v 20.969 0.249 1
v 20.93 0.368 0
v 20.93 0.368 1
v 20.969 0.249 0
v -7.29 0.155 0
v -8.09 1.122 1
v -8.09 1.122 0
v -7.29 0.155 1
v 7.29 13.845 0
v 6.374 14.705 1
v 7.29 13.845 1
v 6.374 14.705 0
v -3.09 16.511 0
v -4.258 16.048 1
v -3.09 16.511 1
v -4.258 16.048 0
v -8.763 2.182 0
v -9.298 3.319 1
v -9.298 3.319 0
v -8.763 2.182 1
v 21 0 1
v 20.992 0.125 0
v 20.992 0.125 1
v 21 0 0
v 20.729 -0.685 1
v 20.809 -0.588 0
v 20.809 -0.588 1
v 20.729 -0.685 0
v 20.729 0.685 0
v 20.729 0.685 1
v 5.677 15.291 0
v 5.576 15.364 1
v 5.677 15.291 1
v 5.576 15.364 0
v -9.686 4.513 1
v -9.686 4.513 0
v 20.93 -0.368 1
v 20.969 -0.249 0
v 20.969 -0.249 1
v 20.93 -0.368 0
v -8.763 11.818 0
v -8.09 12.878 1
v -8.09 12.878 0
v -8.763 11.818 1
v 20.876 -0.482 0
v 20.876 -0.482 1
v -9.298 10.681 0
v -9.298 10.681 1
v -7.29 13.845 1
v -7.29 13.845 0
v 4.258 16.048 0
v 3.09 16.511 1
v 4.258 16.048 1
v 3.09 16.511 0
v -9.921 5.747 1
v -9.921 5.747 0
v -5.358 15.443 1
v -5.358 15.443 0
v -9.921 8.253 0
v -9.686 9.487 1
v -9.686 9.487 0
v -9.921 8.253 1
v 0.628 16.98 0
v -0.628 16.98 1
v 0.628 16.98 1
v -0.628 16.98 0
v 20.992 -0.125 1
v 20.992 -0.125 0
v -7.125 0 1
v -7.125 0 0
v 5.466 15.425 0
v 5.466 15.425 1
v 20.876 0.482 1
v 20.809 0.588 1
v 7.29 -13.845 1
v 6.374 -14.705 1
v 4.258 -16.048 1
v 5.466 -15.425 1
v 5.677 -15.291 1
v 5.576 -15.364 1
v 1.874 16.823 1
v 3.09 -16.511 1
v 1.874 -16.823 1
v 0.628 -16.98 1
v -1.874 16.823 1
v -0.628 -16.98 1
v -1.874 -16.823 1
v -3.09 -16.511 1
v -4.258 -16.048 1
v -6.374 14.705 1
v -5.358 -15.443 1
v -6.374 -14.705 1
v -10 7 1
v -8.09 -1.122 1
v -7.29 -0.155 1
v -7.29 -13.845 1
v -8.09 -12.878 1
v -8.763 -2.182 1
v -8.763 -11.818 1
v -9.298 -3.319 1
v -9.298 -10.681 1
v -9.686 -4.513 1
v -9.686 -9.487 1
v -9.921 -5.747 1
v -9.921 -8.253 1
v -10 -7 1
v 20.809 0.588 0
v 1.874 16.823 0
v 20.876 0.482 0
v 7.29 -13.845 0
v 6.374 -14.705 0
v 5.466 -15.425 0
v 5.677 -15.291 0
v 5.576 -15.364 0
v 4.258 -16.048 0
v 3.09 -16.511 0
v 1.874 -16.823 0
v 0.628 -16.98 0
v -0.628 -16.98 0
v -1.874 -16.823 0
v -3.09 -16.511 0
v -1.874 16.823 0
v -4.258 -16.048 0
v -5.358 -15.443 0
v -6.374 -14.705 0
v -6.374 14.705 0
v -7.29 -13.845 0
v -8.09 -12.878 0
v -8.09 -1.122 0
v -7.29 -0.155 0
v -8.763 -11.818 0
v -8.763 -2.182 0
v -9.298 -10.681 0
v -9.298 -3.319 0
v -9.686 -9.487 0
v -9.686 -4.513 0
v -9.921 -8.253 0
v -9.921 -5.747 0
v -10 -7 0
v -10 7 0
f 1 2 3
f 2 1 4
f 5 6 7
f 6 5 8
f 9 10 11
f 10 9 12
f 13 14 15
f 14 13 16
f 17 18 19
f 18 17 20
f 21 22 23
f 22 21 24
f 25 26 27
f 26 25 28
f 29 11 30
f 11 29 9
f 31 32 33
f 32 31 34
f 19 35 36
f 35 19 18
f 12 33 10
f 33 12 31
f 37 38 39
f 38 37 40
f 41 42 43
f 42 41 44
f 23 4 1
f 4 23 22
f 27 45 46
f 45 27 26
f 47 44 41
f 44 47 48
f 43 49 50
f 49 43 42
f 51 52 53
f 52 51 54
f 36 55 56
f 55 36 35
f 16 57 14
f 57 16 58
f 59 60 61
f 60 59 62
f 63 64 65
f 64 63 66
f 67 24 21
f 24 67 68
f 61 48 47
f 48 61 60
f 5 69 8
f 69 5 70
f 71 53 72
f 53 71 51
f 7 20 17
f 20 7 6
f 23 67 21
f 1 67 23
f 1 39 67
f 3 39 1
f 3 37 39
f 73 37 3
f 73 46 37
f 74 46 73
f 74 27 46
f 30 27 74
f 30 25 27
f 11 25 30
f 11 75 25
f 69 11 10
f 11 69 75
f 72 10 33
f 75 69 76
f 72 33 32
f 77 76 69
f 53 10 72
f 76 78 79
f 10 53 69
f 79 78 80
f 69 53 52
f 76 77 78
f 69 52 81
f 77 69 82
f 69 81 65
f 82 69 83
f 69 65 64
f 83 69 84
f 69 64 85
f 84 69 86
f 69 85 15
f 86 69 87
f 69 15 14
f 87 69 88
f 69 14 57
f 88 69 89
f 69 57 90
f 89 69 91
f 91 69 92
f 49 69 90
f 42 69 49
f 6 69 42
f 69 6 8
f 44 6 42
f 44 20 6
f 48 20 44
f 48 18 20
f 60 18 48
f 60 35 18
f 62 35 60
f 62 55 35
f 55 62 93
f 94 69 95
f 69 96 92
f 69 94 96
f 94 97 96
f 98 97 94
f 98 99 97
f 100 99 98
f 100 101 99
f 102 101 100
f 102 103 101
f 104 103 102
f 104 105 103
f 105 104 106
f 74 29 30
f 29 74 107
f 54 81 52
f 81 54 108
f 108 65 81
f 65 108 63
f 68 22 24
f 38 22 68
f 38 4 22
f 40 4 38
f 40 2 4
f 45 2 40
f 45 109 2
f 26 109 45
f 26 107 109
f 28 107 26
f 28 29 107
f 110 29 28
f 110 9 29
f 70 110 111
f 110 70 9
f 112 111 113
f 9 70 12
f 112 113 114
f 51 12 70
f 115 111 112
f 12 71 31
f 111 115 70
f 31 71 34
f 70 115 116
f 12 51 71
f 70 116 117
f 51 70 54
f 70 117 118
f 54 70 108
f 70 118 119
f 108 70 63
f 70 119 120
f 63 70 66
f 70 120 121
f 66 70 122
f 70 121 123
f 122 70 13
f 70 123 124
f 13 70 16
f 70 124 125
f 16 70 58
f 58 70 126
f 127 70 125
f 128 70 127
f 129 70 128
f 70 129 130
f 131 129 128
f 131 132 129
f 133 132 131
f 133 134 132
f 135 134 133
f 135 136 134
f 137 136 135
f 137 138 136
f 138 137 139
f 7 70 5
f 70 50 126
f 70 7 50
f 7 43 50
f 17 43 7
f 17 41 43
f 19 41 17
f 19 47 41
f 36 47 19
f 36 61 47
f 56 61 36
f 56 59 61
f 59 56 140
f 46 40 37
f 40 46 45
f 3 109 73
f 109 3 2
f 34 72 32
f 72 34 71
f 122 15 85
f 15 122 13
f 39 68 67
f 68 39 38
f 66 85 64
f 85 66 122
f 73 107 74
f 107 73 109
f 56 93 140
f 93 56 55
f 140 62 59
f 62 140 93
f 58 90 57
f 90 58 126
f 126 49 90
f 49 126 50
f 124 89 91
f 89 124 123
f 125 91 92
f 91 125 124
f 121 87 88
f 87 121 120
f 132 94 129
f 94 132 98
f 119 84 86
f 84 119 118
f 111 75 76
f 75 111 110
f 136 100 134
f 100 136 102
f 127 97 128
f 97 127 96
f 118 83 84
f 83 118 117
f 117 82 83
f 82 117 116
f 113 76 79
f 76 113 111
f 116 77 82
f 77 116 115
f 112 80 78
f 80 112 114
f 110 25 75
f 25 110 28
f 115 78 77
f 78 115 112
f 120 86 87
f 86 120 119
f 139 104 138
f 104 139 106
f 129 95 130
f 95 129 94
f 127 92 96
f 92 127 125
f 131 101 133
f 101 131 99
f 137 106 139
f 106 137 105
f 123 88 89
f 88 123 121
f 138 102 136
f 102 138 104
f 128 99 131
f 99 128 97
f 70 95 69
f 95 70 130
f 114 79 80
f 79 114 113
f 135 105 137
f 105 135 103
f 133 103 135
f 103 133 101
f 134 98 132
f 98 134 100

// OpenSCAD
$fn=50;
union() {
  hull() {
    translate([0, 7, 0]) cylinder(1, 10, 10);
    translate([20, 0, 0]) cylinder(1, 1, 1);
    translate([5.04, 14.52, 0]) cylinder(1, 1, 1);
  }
  mirror([0, 20, 0]) hull() {
    translate([0, 7, 0]) cylinder(1, 10, 10);
    translate([20, 0, 0]) cylinder(1, 1, 1);
    translate([5.04, 14.52, 0]) cylinder(1, 1, 1);
  }
}
